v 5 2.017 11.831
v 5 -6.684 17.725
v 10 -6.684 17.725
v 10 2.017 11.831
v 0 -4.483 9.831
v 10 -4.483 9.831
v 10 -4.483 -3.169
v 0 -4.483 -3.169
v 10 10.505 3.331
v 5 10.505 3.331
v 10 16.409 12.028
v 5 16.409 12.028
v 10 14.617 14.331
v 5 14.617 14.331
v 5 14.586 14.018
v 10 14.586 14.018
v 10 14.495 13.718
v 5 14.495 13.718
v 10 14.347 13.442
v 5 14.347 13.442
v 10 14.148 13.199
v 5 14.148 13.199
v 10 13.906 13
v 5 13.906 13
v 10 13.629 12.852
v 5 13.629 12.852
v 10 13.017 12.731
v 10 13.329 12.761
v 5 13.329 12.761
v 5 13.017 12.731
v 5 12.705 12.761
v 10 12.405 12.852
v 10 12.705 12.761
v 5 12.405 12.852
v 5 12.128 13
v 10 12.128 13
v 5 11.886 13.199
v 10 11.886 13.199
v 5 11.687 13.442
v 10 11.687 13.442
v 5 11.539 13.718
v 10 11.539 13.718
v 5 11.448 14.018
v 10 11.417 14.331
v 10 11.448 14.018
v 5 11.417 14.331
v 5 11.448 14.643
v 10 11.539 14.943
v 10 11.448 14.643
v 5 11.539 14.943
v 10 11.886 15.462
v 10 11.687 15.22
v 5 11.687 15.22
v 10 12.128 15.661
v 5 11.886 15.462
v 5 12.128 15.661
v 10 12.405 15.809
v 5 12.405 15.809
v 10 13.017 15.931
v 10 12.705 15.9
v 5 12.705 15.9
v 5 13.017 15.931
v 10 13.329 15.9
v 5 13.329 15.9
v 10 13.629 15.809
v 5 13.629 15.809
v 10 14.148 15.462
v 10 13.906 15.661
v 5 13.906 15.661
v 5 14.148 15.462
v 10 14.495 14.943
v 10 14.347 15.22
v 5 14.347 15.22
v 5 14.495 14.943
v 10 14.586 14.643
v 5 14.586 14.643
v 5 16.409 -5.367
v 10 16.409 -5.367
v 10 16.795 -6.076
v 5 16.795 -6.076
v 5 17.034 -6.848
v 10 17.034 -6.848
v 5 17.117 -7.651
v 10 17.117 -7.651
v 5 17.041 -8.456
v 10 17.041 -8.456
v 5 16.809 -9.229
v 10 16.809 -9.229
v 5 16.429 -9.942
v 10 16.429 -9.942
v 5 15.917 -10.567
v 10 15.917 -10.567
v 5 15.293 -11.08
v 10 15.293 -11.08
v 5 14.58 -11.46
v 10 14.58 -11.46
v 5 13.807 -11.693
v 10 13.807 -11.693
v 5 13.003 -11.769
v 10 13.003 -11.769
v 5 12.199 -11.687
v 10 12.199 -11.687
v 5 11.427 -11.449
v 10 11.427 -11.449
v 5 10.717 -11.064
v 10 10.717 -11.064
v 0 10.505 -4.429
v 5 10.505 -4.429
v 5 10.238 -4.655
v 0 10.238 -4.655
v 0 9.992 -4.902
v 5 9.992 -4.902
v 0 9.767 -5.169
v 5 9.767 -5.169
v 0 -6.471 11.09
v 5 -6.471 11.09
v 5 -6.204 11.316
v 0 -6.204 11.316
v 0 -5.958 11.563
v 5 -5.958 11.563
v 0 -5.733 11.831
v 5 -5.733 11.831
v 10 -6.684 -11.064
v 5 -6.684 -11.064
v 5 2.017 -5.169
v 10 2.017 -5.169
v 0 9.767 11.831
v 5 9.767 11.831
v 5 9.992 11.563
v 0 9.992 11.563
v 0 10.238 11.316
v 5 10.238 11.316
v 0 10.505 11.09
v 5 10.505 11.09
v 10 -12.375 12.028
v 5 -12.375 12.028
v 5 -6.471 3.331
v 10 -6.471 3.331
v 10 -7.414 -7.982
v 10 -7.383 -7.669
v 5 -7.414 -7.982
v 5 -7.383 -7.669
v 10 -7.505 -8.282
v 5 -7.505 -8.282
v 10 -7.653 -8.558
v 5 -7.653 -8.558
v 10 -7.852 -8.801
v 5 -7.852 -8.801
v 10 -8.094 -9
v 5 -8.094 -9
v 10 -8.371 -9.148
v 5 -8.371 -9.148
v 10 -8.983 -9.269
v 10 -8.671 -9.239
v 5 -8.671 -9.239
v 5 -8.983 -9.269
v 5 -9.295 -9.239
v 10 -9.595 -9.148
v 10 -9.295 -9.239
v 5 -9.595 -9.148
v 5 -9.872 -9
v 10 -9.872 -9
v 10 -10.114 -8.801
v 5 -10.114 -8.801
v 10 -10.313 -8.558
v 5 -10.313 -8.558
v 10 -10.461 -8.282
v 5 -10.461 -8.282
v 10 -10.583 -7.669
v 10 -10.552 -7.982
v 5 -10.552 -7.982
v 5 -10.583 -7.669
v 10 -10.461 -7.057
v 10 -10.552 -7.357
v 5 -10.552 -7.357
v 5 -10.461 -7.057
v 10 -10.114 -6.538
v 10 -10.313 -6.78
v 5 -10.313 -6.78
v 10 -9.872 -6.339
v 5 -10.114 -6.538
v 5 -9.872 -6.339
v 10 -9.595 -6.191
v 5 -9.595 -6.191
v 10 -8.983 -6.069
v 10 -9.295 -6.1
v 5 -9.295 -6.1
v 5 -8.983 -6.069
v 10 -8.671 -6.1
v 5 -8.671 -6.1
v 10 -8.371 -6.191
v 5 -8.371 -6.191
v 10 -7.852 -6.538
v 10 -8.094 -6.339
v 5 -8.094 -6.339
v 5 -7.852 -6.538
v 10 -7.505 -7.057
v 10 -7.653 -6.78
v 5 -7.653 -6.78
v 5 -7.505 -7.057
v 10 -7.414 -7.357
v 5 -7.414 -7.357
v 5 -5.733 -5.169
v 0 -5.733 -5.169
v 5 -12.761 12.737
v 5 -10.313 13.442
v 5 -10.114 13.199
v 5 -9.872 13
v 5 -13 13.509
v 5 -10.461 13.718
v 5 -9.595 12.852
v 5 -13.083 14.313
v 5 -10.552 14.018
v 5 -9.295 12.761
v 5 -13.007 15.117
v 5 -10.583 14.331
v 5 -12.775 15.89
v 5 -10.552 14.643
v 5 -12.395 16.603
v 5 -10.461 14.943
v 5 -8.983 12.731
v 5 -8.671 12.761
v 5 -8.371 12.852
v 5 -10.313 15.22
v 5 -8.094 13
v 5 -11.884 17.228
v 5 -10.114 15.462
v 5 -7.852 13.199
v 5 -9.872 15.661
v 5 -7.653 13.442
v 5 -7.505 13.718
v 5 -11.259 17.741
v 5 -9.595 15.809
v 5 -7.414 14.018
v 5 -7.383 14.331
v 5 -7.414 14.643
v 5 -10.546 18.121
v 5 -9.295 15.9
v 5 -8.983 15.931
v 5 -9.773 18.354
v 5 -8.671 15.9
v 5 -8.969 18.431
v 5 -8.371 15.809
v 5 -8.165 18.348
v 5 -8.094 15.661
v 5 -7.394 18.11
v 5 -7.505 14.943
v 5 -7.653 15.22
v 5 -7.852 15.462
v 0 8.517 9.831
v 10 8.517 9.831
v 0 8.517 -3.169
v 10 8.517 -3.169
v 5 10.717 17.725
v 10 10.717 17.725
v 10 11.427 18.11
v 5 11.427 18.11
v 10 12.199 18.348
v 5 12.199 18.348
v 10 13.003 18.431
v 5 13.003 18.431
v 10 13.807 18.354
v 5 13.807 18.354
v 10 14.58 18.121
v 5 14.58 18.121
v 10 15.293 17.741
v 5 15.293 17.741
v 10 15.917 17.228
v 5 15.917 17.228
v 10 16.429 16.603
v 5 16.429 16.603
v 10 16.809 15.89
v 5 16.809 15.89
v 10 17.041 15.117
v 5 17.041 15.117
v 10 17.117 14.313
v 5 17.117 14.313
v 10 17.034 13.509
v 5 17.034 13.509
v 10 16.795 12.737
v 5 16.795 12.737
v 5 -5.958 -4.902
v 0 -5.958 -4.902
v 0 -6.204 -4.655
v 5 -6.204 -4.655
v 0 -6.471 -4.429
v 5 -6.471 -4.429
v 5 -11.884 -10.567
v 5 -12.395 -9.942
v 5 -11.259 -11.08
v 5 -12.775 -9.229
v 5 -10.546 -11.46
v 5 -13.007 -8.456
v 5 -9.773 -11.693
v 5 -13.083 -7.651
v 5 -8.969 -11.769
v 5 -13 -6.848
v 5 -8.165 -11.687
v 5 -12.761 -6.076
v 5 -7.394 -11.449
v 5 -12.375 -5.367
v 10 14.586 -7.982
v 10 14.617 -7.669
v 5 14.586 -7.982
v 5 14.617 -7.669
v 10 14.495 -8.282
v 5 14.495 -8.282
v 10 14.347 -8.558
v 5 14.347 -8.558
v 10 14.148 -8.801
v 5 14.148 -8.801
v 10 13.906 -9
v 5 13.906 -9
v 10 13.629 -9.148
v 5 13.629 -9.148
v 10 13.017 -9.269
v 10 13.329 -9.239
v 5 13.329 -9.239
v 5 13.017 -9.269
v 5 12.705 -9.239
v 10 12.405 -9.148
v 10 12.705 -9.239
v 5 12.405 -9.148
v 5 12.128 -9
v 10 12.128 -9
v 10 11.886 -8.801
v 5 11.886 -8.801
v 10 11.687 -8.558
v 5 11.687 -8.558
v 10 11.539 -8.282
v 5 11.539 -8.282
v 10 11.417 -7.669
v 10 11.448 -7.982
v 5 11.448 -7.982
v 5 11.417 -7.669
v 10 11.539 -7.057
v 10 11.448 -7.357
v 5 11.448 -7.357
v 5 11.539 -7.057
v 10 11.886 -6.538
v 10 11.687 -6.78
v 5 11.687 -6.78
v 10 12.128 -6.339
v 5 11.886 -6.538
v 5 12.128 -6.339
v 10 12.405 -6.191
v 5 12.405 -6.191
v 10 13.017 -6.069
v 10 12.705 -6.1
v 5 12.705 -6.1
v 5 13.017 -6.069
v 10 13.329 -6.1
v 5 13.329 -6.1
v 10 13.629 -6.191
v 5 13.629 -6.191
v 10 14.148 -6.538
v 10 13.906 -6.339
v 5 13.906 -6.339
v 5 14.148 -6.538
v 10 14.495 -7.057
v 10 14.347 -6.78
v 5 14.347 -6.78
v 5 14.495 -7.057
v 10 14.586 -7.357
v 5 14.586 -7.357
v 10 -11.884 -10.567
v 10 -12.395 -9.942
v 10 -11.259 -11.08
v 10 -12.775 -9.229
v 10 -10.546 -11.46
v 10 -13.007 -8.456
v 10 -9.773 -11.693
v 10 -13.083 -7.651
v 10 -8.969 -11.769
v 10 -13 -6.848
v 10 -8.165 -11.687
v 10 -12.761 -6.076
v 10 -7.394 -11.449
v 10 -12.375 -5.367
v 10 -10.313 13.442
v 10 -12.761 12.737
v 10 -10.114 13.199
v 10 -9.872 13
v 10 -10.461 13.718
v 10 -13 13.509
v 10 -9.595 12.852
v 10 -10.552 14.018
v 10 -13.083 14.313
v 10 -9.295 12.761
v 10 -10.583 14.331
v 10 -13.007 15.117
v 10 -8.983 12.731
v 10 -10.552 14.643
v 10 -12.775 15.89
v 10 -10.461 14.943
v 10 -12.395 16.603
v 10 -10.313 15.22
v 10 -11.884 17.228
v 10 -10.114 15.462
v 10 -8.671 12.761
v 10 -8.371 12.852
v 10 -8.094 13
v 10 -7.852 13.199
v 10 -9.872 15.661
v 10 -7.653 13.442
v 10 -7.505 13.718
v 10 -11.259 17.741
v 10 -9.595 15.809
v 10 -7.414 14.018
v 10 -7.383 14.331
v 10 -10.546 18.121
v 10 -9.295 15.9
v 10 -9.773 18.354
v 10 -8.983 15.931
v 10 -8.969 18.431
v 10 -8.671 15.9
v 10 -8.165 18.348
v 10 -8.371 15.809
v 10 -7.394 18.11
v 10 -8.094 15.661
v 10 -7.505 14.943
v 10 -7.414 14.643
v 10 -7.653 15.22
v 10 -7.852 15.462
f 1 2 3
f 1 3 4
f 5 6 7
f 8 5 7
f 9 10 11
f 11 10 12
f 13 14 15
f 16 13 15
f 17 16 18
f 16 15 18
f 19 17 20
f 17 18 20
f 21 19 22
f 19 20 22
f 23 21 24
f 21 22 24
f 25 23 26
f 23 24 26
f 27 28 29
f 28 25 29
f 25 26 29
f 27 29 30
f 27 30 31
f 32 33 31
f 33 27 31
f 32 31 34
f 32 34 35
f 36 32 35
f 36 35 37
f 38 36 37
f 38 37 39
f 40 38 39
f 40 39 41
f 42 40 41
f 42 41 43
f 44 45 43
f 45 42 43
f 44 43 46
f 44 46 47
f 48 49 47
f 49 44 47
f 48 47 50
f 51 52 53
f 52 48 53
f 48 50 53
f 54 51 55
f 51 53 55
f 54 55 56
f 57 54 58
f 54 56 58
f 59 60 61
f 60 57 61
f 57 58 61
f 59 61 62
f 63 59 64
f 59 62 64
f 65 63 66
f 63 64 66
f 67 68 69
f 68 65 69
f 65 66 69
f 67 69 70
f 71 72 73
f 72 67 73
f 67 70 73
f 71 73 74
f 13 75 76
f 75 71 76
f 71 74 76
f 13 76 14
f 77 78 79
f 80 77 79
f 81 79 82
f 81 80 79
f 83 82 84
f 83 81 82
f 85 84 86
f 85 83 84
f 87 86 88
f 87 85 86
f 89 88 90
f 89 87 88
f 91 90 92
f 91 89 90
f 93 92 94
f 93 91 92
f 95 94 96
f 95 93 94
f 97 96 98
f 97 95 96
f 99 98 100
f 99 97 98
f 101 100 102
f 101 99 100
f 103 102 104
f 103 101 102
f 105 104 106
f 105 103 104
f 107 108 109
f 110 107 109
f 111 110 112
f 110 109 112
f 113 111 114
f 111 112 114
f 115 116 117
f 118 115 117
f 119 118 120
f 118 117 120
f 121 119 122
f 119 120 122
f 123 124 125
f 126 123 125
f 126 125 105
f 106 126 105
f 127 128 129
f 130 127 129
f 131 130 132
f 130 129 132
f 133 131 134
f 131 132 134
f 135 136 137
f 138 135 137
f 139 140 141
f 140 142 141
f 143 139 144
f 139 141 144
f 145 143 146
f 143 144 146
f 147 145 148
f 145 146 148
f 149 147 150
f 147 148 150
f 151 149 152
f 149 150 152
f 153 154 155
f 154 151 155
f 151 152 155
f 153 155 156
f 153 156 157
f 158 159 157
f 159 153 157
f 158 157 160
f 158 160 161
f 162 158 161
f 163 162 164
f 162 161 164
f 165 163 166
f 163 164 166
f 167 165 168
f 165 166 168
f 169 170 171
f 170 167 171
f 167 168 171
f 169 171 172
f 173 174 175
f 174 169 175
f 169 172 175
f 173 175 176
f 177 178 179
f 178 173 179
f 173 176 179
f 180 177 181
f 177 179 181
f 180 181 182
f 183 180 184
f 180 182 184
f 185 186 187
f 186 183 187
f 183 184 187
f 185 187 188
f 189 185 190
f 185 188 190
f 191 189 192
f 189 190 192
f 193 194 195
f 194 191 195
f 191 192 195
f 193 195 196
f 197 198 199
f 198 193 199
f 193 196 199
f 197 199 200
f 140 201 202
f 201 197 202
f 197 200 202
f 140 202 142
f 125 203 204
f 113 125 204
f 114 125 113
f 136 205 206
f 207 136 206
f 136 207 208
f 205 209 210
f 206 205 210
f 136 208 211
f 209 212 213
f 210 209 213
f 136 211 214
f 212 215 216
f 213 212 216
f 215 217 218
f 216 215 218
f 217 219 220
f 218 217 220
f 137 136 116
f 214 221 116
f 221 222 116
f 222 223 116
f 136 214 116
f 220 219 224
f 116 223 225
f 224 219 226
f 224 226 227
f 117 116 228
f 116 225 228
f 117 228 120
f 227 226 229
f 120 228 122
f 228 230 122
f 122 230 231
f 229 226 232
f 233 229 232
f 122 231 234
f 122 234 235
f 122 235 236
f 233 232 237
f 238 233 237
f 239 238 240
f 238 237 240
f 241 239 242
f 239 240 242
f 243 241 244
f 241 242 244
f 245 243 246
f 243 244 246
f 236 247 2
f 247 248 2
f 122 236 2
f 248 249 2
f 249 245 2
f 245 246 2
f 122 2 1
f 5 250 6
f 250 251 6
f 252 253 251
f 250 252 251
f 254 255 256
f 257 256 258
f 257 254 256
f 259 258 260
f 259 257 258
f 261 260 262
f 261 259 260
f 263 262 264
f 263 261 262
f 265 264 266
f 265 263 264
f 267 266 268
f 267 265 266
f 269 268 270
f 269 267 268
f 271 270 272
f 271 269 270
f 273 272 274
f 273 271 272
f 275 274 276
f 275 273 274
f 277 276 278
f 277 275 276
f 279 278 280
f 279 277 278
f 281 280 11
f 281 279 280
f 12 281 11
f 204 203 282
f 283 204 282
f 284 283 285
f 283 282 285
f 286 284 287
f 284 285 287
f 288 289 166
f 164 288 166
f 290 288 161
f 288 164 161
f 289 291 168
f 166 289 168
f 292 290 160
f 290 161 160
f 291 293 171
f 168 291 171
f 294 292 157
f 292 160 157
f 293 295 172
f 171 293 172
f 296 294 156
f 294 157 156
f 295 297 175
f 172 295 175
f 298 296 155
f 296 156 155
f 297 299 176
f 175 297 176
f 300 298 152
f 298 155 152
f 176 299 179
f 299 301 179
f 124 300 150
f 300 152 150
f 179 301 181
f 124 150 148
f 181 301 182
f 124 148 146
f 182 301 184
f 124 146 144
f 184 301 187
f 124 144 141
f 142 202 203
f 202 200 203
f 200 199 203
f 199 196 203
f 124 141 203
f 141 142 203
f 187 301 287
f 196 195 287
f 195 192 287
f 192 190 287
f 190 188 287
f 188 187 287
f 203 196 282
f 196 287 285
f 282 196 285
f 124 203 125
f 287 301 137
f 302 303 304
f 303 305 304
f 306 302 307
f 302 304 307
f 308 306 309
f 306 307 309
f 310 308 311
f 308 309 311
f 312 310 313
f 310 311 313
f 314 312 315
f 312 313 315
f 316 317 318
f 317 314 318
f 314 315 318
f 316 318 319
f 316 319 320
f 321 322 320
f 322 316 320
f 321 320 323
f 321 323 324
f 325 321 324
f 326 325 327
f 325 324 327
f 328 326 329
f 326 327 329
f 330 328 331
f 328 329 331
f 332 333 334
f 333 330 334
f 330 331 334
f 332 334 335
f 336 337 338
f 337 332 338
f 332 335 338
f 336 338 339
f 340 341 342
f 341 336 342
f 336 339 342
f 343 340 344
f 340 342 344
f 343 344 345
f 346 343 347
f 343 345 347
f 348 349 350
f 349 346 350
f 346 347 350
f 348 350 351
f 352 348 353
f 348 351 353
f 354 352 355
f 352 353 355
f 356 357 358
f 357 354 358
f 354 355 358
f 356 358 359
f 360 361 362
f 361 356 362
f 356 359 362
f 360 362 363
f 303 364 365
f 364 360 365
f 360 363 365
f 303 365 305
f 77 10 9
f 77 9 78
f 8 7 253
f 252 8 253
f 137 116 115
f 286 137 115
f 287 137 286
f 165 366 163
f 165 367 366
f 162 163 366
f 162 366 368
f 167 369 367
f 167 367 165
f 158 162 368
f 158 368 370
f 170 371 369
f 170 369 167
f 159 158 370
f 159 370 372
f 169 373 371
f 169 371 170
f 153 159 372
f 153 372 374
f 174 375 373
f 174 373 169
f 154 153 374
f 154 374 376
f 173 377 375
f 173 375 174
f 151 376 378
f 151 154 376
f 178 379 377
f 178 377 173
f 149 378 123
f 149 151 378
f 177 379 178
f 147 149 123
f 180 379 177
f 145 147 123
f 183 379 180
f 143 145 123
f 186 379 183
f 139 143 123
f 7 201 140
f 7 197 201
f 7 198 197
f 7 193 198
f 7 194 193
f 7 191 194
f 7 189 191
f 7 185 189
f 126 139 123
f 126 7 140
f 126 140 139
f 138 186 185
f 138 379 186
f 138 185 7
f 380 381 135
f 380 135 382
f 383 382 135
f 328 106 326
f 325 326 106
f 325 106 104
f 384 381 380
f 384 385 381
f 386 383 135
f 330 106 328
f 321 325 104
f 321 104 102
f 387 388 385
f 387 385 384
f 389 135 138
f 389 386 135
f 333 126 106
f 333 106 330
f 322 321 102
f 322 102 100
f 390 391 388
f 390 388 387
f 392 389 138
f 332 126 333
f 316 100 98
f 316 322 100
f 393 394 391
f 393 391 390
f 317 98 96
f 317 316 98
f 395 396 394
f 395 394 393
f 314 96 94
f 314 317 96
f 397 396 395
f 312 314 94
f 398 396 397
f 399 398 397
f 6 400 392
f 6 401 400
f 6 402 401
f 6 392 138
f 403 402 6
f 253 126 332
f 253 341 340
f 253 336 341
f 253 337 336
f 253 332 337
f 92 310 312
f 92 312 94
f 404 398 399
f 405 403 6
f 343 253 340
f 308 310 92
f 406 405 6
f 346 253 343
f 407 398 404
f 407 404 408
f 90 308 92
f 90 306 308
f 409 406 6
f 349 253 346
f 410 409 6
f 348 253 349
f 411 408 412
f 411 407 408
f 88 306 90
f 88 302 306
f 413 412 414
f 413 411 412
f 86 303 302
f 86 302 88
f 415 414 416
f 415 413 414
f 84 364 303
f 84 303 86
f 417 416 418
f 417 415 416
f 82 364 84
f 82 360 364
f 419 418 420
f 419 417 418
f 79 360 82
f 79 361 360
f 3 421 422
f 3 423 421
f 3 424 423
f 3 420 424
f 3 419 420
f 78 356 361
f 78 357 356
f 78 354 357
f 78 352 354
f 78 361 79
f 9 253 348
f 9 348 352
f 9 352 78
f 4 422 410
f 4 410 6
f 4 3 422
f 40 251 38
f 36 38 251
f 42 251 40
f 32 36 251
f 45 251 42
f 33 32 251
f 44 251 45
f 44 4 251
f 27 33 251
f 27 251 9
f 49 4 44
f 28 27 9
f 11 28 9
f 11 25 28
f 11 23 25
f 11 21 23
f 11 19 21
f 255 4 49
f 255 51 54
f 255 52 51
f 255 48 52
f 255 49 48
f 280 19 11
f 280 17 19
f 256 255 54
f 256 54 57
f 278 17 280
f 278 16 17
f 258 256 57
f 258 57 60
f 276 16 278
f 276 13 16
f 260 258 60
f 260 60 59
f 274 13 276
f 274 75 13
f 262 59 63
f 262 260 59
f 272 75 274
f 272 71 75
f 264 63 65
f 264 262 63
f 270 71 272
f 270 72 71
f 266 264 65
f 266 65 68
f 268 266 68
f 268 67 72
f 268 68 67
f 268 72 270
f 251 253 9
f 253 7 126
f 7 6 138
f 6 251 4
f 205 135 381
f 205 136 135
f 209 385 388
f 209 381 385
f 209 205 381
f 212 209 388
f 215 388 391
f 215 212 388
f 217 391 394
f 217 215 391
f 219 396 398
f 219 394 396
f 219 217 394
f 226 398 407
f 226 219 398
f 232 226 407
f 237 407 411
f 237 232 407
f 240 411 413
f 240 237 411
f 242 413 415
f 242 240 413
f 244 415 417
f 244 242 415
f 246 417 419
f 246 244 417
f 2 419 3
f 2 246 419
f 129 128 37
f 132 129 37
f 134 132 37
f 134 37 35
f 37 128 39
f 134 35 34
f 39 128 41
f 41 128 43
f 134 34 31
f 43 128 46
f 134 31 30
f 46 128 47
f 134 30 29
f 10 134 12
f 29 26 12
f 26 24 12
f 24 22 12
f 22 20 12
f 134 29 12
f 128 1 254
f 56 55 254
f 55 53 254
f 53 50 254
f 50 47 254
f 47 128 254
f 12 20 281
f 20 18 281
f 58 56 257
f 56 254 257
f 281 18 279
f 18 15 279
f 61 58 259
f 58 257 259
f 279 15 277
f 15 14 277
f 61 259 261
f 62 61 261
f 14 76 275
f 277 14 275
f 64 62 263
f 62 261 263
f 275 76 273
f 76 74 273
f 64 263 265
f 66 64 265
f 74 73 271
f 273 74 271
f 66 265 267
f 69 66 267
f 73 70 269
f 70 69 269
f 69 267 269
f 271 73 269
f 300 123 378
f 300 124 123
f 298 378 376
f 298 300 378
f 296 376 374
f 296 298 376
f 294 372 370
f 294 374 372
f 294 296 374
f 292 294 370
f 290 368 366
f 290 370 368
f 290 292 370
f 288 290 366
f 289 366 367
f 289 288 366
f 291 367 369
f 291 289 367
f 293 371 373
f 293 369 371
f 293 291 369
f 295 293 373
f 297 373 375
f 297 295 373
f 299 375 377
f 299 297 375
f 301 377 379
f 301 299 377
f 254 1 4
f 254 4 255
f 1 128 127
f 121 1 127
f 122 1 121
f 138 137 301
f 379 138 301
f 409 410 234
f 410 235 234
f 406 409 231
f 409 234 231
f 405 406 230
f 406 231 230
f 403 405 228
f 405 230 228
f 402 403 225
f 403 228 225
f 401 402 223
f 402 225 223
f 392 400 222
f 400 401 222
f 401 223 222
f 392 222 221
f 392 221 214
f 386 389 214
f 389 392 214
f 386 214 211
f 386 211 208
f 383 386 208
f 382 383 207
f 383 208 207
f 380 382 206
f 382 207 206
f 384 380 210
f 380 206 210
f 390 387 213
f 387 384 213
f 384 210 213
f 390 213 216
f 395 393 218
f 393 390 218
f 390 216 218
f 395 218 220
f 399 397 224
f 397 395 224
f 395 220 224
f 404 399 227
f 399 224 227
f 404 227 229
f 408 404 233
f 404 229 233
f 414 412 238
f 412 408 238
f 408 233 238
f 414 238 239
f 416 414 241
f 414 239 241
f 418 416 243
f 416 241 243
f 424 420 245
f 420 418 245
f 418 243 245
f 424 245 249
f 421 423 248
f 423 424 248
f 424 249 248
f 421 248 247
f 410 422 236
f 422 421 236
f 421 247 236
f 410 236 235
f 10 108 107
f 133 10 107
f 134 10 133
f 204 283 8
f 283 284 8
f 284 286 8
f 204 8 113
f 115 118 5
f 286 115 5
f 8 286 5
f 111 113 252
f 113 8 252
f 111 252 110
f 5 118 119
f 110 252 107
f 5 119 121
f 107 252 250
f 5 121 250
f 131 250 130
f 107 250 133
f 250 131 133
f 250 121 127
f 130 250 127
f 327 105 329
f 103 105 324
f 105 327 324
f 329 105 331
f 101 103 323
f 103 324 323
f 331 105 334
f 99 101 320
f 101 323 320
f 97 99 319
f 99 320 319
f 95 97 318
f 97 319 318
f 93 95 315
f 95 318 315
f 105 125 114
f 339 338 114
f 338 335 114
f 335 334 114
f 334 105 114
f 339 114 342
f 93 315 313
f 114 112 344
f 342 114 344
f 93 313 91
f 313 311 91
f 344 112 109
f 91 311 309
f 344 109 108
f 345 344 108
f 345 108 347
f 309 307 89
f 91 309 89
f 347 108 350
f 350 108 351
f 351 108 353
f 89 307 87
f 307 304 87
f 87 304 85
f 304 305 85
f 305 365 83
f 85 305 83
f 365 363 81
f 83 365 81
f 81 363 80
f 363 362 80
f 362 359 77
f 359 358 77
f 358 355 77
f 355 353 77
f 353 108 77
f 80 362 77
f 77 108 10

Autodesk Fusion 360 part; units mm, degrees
sketch "Sketch2" plane through (5, 0, 0) normal (1, 0, 0) x (0, 1, 0)
  line L0 (16.9637, 18.2844) -> (-13.0292, -11.7227) construction
  line L1 (-12.9363, 18.2856) -> (17.0619, -11.7162) construction
  circle A0 centre (13.0169, 14.3306) radius 1.6
  circle A1 centre (-8.9831, 14.3306) radius 1.6
  circle A2 centre (-8.9831, -7.6694) radius 1.6
  circle A3 centre (13.0169, -7.6694) radius 1.6
  circle A4 centre (-8.9831, 14.3306) radius 4.1
  circle A5 centre (13.0169, 14.3306) radius 4.1
  circle A6 centre (-8.9831, -7.6694) radius 4.1
  line L2 (9.4619, 10.7862) -> (-5.5274, -4.2245) construction
  line L3 (-6.6835, 17.7249) -> (2.0169, 11.8306)
  line L4 (2.0169, 11.8306) -> (10.7173, 17.7249)
  line L5 (-12.3753, 12.0277) -> (-6.471, 3.3306)
  line L6 (-6.471, 3.3306) -> (-12.3753, -5.3666)
  line L7 (-6.6835, -11.0638) -> (2.0169, -5.1694)
  line L8 (10.5048, 3.3306) -> (16.4091, 12.0277)
  circle A7 centre (13.0169, -7.6694) radius 4.1
  line L9 (10.5048, 3.3306) -> (16.4091, -5.3666)
  line L10 (2.0169, -5.1694) -> (10.7173, -11.0638)
  line L11 (-4.4831, -3.1694) -> (8.5169, -3.1694)
  line L12 (8.5169, -3.1694) -> (8.5169, 9.8306)
  line L13 (8.5169, 9.8306) -> (-4.4831, 9.8306)
  line L14 (-4.4831, 9.8306) -> (-4.4831, -3.1694)
  line L15 (-4.4831, -3.1694) -> (8.5169, 9.8306) construction
  line L16 (8.5169, -3.1694) -> (-4.4831, 9.8306) construction
  line L17 (10.5048, 11.8306) -> (-6.471, 11.8306)
  line L18 (-6.471, 11.8306) -> (-6.471, -5.1694)
  line L19 (-6.471, -5.1694) -> (10.5048, -5.1694)
  line L20 (10.5048, -5.1694) -> (10.5048, 11.8306)
  line L21 (10.5048, 11.8306) -> (-6.471, -5.1694) construction
  line L22 (-6.471, 11.8306) -> (10.5048, -5.1694) construction
  point P0 (2.0169, 3.3306)
  point P1 (2.0169, 3.3306)
  point P2 (2.0169, 3.3306)
  point P3 (2.0169, 3.3306)
  point P4 (2.0169, 3.3306)
  dimension "d11" = 3.2
  dimension "d12" = 11
  dimension "d13" = 3.2
  dimension "d14" = 3.2
  dimension "d15" = 3.2
  dimension "d18" = 11
  dimension "d19" = 22
  dimension "d20" = 8.2
  dimension "d21" = 8.2
  dimension "d22" = 8.2
  dimension "d23" = 8.2
  dimension "d33" = 13
  dimension "d34" = 17
  dimension "d35" = 22
extrude "Extrude8" add sketch "Sketch2" along normal blind 5 contours A4 L17 L18 | A4 L3 L17 | A4 A5 A6 A7 L17 L18 L19 L20 | A4 L17 L18 | A4 L5 L18 | A5 L4 L17 | A6 L6 L18 | A5 L17 L20 | A5 L17 L20 | A6 L18 L19 | A6 L18 L19 | A5 L8 L20 | A6 L7 L19 | A7 L9 L20 | A7 L10 L19 | A7 L19 L20 | A7 L19 L20 | L11 L12 L13 L14
extrude "Extrude9" add sketch "Sketch2" against normal blind 5 contours A4 A5 A6 A7 L17 L18 L19 L20
extrude "Extrude10" cut sketch "Sketch2" along normal blind 5 contours L11 L12 L13 L14
extrude "Extrude3" [suppressed]
equation "d11 = motorScrewHole"
equation "d12 = ( 22 / 2 ) * 1 mm"
equation "d13 = motorScrewHole"
equation "d14 = motorScrewHole"
equation "d15 = motorScrewHole"
equation "motorScrewHole = 3.2 mm" comment "poo"
equation "d18 = ( 22 / 2 ) * 1 mm"
equation "d20 = motorScrewHole + 5 mm"
equation "d21 = motorScrewHole + 5 mm"
equation "d22 = motorScrewHole + 5 mm"
equation "d23 = motorScrewHole + 5 mm"
